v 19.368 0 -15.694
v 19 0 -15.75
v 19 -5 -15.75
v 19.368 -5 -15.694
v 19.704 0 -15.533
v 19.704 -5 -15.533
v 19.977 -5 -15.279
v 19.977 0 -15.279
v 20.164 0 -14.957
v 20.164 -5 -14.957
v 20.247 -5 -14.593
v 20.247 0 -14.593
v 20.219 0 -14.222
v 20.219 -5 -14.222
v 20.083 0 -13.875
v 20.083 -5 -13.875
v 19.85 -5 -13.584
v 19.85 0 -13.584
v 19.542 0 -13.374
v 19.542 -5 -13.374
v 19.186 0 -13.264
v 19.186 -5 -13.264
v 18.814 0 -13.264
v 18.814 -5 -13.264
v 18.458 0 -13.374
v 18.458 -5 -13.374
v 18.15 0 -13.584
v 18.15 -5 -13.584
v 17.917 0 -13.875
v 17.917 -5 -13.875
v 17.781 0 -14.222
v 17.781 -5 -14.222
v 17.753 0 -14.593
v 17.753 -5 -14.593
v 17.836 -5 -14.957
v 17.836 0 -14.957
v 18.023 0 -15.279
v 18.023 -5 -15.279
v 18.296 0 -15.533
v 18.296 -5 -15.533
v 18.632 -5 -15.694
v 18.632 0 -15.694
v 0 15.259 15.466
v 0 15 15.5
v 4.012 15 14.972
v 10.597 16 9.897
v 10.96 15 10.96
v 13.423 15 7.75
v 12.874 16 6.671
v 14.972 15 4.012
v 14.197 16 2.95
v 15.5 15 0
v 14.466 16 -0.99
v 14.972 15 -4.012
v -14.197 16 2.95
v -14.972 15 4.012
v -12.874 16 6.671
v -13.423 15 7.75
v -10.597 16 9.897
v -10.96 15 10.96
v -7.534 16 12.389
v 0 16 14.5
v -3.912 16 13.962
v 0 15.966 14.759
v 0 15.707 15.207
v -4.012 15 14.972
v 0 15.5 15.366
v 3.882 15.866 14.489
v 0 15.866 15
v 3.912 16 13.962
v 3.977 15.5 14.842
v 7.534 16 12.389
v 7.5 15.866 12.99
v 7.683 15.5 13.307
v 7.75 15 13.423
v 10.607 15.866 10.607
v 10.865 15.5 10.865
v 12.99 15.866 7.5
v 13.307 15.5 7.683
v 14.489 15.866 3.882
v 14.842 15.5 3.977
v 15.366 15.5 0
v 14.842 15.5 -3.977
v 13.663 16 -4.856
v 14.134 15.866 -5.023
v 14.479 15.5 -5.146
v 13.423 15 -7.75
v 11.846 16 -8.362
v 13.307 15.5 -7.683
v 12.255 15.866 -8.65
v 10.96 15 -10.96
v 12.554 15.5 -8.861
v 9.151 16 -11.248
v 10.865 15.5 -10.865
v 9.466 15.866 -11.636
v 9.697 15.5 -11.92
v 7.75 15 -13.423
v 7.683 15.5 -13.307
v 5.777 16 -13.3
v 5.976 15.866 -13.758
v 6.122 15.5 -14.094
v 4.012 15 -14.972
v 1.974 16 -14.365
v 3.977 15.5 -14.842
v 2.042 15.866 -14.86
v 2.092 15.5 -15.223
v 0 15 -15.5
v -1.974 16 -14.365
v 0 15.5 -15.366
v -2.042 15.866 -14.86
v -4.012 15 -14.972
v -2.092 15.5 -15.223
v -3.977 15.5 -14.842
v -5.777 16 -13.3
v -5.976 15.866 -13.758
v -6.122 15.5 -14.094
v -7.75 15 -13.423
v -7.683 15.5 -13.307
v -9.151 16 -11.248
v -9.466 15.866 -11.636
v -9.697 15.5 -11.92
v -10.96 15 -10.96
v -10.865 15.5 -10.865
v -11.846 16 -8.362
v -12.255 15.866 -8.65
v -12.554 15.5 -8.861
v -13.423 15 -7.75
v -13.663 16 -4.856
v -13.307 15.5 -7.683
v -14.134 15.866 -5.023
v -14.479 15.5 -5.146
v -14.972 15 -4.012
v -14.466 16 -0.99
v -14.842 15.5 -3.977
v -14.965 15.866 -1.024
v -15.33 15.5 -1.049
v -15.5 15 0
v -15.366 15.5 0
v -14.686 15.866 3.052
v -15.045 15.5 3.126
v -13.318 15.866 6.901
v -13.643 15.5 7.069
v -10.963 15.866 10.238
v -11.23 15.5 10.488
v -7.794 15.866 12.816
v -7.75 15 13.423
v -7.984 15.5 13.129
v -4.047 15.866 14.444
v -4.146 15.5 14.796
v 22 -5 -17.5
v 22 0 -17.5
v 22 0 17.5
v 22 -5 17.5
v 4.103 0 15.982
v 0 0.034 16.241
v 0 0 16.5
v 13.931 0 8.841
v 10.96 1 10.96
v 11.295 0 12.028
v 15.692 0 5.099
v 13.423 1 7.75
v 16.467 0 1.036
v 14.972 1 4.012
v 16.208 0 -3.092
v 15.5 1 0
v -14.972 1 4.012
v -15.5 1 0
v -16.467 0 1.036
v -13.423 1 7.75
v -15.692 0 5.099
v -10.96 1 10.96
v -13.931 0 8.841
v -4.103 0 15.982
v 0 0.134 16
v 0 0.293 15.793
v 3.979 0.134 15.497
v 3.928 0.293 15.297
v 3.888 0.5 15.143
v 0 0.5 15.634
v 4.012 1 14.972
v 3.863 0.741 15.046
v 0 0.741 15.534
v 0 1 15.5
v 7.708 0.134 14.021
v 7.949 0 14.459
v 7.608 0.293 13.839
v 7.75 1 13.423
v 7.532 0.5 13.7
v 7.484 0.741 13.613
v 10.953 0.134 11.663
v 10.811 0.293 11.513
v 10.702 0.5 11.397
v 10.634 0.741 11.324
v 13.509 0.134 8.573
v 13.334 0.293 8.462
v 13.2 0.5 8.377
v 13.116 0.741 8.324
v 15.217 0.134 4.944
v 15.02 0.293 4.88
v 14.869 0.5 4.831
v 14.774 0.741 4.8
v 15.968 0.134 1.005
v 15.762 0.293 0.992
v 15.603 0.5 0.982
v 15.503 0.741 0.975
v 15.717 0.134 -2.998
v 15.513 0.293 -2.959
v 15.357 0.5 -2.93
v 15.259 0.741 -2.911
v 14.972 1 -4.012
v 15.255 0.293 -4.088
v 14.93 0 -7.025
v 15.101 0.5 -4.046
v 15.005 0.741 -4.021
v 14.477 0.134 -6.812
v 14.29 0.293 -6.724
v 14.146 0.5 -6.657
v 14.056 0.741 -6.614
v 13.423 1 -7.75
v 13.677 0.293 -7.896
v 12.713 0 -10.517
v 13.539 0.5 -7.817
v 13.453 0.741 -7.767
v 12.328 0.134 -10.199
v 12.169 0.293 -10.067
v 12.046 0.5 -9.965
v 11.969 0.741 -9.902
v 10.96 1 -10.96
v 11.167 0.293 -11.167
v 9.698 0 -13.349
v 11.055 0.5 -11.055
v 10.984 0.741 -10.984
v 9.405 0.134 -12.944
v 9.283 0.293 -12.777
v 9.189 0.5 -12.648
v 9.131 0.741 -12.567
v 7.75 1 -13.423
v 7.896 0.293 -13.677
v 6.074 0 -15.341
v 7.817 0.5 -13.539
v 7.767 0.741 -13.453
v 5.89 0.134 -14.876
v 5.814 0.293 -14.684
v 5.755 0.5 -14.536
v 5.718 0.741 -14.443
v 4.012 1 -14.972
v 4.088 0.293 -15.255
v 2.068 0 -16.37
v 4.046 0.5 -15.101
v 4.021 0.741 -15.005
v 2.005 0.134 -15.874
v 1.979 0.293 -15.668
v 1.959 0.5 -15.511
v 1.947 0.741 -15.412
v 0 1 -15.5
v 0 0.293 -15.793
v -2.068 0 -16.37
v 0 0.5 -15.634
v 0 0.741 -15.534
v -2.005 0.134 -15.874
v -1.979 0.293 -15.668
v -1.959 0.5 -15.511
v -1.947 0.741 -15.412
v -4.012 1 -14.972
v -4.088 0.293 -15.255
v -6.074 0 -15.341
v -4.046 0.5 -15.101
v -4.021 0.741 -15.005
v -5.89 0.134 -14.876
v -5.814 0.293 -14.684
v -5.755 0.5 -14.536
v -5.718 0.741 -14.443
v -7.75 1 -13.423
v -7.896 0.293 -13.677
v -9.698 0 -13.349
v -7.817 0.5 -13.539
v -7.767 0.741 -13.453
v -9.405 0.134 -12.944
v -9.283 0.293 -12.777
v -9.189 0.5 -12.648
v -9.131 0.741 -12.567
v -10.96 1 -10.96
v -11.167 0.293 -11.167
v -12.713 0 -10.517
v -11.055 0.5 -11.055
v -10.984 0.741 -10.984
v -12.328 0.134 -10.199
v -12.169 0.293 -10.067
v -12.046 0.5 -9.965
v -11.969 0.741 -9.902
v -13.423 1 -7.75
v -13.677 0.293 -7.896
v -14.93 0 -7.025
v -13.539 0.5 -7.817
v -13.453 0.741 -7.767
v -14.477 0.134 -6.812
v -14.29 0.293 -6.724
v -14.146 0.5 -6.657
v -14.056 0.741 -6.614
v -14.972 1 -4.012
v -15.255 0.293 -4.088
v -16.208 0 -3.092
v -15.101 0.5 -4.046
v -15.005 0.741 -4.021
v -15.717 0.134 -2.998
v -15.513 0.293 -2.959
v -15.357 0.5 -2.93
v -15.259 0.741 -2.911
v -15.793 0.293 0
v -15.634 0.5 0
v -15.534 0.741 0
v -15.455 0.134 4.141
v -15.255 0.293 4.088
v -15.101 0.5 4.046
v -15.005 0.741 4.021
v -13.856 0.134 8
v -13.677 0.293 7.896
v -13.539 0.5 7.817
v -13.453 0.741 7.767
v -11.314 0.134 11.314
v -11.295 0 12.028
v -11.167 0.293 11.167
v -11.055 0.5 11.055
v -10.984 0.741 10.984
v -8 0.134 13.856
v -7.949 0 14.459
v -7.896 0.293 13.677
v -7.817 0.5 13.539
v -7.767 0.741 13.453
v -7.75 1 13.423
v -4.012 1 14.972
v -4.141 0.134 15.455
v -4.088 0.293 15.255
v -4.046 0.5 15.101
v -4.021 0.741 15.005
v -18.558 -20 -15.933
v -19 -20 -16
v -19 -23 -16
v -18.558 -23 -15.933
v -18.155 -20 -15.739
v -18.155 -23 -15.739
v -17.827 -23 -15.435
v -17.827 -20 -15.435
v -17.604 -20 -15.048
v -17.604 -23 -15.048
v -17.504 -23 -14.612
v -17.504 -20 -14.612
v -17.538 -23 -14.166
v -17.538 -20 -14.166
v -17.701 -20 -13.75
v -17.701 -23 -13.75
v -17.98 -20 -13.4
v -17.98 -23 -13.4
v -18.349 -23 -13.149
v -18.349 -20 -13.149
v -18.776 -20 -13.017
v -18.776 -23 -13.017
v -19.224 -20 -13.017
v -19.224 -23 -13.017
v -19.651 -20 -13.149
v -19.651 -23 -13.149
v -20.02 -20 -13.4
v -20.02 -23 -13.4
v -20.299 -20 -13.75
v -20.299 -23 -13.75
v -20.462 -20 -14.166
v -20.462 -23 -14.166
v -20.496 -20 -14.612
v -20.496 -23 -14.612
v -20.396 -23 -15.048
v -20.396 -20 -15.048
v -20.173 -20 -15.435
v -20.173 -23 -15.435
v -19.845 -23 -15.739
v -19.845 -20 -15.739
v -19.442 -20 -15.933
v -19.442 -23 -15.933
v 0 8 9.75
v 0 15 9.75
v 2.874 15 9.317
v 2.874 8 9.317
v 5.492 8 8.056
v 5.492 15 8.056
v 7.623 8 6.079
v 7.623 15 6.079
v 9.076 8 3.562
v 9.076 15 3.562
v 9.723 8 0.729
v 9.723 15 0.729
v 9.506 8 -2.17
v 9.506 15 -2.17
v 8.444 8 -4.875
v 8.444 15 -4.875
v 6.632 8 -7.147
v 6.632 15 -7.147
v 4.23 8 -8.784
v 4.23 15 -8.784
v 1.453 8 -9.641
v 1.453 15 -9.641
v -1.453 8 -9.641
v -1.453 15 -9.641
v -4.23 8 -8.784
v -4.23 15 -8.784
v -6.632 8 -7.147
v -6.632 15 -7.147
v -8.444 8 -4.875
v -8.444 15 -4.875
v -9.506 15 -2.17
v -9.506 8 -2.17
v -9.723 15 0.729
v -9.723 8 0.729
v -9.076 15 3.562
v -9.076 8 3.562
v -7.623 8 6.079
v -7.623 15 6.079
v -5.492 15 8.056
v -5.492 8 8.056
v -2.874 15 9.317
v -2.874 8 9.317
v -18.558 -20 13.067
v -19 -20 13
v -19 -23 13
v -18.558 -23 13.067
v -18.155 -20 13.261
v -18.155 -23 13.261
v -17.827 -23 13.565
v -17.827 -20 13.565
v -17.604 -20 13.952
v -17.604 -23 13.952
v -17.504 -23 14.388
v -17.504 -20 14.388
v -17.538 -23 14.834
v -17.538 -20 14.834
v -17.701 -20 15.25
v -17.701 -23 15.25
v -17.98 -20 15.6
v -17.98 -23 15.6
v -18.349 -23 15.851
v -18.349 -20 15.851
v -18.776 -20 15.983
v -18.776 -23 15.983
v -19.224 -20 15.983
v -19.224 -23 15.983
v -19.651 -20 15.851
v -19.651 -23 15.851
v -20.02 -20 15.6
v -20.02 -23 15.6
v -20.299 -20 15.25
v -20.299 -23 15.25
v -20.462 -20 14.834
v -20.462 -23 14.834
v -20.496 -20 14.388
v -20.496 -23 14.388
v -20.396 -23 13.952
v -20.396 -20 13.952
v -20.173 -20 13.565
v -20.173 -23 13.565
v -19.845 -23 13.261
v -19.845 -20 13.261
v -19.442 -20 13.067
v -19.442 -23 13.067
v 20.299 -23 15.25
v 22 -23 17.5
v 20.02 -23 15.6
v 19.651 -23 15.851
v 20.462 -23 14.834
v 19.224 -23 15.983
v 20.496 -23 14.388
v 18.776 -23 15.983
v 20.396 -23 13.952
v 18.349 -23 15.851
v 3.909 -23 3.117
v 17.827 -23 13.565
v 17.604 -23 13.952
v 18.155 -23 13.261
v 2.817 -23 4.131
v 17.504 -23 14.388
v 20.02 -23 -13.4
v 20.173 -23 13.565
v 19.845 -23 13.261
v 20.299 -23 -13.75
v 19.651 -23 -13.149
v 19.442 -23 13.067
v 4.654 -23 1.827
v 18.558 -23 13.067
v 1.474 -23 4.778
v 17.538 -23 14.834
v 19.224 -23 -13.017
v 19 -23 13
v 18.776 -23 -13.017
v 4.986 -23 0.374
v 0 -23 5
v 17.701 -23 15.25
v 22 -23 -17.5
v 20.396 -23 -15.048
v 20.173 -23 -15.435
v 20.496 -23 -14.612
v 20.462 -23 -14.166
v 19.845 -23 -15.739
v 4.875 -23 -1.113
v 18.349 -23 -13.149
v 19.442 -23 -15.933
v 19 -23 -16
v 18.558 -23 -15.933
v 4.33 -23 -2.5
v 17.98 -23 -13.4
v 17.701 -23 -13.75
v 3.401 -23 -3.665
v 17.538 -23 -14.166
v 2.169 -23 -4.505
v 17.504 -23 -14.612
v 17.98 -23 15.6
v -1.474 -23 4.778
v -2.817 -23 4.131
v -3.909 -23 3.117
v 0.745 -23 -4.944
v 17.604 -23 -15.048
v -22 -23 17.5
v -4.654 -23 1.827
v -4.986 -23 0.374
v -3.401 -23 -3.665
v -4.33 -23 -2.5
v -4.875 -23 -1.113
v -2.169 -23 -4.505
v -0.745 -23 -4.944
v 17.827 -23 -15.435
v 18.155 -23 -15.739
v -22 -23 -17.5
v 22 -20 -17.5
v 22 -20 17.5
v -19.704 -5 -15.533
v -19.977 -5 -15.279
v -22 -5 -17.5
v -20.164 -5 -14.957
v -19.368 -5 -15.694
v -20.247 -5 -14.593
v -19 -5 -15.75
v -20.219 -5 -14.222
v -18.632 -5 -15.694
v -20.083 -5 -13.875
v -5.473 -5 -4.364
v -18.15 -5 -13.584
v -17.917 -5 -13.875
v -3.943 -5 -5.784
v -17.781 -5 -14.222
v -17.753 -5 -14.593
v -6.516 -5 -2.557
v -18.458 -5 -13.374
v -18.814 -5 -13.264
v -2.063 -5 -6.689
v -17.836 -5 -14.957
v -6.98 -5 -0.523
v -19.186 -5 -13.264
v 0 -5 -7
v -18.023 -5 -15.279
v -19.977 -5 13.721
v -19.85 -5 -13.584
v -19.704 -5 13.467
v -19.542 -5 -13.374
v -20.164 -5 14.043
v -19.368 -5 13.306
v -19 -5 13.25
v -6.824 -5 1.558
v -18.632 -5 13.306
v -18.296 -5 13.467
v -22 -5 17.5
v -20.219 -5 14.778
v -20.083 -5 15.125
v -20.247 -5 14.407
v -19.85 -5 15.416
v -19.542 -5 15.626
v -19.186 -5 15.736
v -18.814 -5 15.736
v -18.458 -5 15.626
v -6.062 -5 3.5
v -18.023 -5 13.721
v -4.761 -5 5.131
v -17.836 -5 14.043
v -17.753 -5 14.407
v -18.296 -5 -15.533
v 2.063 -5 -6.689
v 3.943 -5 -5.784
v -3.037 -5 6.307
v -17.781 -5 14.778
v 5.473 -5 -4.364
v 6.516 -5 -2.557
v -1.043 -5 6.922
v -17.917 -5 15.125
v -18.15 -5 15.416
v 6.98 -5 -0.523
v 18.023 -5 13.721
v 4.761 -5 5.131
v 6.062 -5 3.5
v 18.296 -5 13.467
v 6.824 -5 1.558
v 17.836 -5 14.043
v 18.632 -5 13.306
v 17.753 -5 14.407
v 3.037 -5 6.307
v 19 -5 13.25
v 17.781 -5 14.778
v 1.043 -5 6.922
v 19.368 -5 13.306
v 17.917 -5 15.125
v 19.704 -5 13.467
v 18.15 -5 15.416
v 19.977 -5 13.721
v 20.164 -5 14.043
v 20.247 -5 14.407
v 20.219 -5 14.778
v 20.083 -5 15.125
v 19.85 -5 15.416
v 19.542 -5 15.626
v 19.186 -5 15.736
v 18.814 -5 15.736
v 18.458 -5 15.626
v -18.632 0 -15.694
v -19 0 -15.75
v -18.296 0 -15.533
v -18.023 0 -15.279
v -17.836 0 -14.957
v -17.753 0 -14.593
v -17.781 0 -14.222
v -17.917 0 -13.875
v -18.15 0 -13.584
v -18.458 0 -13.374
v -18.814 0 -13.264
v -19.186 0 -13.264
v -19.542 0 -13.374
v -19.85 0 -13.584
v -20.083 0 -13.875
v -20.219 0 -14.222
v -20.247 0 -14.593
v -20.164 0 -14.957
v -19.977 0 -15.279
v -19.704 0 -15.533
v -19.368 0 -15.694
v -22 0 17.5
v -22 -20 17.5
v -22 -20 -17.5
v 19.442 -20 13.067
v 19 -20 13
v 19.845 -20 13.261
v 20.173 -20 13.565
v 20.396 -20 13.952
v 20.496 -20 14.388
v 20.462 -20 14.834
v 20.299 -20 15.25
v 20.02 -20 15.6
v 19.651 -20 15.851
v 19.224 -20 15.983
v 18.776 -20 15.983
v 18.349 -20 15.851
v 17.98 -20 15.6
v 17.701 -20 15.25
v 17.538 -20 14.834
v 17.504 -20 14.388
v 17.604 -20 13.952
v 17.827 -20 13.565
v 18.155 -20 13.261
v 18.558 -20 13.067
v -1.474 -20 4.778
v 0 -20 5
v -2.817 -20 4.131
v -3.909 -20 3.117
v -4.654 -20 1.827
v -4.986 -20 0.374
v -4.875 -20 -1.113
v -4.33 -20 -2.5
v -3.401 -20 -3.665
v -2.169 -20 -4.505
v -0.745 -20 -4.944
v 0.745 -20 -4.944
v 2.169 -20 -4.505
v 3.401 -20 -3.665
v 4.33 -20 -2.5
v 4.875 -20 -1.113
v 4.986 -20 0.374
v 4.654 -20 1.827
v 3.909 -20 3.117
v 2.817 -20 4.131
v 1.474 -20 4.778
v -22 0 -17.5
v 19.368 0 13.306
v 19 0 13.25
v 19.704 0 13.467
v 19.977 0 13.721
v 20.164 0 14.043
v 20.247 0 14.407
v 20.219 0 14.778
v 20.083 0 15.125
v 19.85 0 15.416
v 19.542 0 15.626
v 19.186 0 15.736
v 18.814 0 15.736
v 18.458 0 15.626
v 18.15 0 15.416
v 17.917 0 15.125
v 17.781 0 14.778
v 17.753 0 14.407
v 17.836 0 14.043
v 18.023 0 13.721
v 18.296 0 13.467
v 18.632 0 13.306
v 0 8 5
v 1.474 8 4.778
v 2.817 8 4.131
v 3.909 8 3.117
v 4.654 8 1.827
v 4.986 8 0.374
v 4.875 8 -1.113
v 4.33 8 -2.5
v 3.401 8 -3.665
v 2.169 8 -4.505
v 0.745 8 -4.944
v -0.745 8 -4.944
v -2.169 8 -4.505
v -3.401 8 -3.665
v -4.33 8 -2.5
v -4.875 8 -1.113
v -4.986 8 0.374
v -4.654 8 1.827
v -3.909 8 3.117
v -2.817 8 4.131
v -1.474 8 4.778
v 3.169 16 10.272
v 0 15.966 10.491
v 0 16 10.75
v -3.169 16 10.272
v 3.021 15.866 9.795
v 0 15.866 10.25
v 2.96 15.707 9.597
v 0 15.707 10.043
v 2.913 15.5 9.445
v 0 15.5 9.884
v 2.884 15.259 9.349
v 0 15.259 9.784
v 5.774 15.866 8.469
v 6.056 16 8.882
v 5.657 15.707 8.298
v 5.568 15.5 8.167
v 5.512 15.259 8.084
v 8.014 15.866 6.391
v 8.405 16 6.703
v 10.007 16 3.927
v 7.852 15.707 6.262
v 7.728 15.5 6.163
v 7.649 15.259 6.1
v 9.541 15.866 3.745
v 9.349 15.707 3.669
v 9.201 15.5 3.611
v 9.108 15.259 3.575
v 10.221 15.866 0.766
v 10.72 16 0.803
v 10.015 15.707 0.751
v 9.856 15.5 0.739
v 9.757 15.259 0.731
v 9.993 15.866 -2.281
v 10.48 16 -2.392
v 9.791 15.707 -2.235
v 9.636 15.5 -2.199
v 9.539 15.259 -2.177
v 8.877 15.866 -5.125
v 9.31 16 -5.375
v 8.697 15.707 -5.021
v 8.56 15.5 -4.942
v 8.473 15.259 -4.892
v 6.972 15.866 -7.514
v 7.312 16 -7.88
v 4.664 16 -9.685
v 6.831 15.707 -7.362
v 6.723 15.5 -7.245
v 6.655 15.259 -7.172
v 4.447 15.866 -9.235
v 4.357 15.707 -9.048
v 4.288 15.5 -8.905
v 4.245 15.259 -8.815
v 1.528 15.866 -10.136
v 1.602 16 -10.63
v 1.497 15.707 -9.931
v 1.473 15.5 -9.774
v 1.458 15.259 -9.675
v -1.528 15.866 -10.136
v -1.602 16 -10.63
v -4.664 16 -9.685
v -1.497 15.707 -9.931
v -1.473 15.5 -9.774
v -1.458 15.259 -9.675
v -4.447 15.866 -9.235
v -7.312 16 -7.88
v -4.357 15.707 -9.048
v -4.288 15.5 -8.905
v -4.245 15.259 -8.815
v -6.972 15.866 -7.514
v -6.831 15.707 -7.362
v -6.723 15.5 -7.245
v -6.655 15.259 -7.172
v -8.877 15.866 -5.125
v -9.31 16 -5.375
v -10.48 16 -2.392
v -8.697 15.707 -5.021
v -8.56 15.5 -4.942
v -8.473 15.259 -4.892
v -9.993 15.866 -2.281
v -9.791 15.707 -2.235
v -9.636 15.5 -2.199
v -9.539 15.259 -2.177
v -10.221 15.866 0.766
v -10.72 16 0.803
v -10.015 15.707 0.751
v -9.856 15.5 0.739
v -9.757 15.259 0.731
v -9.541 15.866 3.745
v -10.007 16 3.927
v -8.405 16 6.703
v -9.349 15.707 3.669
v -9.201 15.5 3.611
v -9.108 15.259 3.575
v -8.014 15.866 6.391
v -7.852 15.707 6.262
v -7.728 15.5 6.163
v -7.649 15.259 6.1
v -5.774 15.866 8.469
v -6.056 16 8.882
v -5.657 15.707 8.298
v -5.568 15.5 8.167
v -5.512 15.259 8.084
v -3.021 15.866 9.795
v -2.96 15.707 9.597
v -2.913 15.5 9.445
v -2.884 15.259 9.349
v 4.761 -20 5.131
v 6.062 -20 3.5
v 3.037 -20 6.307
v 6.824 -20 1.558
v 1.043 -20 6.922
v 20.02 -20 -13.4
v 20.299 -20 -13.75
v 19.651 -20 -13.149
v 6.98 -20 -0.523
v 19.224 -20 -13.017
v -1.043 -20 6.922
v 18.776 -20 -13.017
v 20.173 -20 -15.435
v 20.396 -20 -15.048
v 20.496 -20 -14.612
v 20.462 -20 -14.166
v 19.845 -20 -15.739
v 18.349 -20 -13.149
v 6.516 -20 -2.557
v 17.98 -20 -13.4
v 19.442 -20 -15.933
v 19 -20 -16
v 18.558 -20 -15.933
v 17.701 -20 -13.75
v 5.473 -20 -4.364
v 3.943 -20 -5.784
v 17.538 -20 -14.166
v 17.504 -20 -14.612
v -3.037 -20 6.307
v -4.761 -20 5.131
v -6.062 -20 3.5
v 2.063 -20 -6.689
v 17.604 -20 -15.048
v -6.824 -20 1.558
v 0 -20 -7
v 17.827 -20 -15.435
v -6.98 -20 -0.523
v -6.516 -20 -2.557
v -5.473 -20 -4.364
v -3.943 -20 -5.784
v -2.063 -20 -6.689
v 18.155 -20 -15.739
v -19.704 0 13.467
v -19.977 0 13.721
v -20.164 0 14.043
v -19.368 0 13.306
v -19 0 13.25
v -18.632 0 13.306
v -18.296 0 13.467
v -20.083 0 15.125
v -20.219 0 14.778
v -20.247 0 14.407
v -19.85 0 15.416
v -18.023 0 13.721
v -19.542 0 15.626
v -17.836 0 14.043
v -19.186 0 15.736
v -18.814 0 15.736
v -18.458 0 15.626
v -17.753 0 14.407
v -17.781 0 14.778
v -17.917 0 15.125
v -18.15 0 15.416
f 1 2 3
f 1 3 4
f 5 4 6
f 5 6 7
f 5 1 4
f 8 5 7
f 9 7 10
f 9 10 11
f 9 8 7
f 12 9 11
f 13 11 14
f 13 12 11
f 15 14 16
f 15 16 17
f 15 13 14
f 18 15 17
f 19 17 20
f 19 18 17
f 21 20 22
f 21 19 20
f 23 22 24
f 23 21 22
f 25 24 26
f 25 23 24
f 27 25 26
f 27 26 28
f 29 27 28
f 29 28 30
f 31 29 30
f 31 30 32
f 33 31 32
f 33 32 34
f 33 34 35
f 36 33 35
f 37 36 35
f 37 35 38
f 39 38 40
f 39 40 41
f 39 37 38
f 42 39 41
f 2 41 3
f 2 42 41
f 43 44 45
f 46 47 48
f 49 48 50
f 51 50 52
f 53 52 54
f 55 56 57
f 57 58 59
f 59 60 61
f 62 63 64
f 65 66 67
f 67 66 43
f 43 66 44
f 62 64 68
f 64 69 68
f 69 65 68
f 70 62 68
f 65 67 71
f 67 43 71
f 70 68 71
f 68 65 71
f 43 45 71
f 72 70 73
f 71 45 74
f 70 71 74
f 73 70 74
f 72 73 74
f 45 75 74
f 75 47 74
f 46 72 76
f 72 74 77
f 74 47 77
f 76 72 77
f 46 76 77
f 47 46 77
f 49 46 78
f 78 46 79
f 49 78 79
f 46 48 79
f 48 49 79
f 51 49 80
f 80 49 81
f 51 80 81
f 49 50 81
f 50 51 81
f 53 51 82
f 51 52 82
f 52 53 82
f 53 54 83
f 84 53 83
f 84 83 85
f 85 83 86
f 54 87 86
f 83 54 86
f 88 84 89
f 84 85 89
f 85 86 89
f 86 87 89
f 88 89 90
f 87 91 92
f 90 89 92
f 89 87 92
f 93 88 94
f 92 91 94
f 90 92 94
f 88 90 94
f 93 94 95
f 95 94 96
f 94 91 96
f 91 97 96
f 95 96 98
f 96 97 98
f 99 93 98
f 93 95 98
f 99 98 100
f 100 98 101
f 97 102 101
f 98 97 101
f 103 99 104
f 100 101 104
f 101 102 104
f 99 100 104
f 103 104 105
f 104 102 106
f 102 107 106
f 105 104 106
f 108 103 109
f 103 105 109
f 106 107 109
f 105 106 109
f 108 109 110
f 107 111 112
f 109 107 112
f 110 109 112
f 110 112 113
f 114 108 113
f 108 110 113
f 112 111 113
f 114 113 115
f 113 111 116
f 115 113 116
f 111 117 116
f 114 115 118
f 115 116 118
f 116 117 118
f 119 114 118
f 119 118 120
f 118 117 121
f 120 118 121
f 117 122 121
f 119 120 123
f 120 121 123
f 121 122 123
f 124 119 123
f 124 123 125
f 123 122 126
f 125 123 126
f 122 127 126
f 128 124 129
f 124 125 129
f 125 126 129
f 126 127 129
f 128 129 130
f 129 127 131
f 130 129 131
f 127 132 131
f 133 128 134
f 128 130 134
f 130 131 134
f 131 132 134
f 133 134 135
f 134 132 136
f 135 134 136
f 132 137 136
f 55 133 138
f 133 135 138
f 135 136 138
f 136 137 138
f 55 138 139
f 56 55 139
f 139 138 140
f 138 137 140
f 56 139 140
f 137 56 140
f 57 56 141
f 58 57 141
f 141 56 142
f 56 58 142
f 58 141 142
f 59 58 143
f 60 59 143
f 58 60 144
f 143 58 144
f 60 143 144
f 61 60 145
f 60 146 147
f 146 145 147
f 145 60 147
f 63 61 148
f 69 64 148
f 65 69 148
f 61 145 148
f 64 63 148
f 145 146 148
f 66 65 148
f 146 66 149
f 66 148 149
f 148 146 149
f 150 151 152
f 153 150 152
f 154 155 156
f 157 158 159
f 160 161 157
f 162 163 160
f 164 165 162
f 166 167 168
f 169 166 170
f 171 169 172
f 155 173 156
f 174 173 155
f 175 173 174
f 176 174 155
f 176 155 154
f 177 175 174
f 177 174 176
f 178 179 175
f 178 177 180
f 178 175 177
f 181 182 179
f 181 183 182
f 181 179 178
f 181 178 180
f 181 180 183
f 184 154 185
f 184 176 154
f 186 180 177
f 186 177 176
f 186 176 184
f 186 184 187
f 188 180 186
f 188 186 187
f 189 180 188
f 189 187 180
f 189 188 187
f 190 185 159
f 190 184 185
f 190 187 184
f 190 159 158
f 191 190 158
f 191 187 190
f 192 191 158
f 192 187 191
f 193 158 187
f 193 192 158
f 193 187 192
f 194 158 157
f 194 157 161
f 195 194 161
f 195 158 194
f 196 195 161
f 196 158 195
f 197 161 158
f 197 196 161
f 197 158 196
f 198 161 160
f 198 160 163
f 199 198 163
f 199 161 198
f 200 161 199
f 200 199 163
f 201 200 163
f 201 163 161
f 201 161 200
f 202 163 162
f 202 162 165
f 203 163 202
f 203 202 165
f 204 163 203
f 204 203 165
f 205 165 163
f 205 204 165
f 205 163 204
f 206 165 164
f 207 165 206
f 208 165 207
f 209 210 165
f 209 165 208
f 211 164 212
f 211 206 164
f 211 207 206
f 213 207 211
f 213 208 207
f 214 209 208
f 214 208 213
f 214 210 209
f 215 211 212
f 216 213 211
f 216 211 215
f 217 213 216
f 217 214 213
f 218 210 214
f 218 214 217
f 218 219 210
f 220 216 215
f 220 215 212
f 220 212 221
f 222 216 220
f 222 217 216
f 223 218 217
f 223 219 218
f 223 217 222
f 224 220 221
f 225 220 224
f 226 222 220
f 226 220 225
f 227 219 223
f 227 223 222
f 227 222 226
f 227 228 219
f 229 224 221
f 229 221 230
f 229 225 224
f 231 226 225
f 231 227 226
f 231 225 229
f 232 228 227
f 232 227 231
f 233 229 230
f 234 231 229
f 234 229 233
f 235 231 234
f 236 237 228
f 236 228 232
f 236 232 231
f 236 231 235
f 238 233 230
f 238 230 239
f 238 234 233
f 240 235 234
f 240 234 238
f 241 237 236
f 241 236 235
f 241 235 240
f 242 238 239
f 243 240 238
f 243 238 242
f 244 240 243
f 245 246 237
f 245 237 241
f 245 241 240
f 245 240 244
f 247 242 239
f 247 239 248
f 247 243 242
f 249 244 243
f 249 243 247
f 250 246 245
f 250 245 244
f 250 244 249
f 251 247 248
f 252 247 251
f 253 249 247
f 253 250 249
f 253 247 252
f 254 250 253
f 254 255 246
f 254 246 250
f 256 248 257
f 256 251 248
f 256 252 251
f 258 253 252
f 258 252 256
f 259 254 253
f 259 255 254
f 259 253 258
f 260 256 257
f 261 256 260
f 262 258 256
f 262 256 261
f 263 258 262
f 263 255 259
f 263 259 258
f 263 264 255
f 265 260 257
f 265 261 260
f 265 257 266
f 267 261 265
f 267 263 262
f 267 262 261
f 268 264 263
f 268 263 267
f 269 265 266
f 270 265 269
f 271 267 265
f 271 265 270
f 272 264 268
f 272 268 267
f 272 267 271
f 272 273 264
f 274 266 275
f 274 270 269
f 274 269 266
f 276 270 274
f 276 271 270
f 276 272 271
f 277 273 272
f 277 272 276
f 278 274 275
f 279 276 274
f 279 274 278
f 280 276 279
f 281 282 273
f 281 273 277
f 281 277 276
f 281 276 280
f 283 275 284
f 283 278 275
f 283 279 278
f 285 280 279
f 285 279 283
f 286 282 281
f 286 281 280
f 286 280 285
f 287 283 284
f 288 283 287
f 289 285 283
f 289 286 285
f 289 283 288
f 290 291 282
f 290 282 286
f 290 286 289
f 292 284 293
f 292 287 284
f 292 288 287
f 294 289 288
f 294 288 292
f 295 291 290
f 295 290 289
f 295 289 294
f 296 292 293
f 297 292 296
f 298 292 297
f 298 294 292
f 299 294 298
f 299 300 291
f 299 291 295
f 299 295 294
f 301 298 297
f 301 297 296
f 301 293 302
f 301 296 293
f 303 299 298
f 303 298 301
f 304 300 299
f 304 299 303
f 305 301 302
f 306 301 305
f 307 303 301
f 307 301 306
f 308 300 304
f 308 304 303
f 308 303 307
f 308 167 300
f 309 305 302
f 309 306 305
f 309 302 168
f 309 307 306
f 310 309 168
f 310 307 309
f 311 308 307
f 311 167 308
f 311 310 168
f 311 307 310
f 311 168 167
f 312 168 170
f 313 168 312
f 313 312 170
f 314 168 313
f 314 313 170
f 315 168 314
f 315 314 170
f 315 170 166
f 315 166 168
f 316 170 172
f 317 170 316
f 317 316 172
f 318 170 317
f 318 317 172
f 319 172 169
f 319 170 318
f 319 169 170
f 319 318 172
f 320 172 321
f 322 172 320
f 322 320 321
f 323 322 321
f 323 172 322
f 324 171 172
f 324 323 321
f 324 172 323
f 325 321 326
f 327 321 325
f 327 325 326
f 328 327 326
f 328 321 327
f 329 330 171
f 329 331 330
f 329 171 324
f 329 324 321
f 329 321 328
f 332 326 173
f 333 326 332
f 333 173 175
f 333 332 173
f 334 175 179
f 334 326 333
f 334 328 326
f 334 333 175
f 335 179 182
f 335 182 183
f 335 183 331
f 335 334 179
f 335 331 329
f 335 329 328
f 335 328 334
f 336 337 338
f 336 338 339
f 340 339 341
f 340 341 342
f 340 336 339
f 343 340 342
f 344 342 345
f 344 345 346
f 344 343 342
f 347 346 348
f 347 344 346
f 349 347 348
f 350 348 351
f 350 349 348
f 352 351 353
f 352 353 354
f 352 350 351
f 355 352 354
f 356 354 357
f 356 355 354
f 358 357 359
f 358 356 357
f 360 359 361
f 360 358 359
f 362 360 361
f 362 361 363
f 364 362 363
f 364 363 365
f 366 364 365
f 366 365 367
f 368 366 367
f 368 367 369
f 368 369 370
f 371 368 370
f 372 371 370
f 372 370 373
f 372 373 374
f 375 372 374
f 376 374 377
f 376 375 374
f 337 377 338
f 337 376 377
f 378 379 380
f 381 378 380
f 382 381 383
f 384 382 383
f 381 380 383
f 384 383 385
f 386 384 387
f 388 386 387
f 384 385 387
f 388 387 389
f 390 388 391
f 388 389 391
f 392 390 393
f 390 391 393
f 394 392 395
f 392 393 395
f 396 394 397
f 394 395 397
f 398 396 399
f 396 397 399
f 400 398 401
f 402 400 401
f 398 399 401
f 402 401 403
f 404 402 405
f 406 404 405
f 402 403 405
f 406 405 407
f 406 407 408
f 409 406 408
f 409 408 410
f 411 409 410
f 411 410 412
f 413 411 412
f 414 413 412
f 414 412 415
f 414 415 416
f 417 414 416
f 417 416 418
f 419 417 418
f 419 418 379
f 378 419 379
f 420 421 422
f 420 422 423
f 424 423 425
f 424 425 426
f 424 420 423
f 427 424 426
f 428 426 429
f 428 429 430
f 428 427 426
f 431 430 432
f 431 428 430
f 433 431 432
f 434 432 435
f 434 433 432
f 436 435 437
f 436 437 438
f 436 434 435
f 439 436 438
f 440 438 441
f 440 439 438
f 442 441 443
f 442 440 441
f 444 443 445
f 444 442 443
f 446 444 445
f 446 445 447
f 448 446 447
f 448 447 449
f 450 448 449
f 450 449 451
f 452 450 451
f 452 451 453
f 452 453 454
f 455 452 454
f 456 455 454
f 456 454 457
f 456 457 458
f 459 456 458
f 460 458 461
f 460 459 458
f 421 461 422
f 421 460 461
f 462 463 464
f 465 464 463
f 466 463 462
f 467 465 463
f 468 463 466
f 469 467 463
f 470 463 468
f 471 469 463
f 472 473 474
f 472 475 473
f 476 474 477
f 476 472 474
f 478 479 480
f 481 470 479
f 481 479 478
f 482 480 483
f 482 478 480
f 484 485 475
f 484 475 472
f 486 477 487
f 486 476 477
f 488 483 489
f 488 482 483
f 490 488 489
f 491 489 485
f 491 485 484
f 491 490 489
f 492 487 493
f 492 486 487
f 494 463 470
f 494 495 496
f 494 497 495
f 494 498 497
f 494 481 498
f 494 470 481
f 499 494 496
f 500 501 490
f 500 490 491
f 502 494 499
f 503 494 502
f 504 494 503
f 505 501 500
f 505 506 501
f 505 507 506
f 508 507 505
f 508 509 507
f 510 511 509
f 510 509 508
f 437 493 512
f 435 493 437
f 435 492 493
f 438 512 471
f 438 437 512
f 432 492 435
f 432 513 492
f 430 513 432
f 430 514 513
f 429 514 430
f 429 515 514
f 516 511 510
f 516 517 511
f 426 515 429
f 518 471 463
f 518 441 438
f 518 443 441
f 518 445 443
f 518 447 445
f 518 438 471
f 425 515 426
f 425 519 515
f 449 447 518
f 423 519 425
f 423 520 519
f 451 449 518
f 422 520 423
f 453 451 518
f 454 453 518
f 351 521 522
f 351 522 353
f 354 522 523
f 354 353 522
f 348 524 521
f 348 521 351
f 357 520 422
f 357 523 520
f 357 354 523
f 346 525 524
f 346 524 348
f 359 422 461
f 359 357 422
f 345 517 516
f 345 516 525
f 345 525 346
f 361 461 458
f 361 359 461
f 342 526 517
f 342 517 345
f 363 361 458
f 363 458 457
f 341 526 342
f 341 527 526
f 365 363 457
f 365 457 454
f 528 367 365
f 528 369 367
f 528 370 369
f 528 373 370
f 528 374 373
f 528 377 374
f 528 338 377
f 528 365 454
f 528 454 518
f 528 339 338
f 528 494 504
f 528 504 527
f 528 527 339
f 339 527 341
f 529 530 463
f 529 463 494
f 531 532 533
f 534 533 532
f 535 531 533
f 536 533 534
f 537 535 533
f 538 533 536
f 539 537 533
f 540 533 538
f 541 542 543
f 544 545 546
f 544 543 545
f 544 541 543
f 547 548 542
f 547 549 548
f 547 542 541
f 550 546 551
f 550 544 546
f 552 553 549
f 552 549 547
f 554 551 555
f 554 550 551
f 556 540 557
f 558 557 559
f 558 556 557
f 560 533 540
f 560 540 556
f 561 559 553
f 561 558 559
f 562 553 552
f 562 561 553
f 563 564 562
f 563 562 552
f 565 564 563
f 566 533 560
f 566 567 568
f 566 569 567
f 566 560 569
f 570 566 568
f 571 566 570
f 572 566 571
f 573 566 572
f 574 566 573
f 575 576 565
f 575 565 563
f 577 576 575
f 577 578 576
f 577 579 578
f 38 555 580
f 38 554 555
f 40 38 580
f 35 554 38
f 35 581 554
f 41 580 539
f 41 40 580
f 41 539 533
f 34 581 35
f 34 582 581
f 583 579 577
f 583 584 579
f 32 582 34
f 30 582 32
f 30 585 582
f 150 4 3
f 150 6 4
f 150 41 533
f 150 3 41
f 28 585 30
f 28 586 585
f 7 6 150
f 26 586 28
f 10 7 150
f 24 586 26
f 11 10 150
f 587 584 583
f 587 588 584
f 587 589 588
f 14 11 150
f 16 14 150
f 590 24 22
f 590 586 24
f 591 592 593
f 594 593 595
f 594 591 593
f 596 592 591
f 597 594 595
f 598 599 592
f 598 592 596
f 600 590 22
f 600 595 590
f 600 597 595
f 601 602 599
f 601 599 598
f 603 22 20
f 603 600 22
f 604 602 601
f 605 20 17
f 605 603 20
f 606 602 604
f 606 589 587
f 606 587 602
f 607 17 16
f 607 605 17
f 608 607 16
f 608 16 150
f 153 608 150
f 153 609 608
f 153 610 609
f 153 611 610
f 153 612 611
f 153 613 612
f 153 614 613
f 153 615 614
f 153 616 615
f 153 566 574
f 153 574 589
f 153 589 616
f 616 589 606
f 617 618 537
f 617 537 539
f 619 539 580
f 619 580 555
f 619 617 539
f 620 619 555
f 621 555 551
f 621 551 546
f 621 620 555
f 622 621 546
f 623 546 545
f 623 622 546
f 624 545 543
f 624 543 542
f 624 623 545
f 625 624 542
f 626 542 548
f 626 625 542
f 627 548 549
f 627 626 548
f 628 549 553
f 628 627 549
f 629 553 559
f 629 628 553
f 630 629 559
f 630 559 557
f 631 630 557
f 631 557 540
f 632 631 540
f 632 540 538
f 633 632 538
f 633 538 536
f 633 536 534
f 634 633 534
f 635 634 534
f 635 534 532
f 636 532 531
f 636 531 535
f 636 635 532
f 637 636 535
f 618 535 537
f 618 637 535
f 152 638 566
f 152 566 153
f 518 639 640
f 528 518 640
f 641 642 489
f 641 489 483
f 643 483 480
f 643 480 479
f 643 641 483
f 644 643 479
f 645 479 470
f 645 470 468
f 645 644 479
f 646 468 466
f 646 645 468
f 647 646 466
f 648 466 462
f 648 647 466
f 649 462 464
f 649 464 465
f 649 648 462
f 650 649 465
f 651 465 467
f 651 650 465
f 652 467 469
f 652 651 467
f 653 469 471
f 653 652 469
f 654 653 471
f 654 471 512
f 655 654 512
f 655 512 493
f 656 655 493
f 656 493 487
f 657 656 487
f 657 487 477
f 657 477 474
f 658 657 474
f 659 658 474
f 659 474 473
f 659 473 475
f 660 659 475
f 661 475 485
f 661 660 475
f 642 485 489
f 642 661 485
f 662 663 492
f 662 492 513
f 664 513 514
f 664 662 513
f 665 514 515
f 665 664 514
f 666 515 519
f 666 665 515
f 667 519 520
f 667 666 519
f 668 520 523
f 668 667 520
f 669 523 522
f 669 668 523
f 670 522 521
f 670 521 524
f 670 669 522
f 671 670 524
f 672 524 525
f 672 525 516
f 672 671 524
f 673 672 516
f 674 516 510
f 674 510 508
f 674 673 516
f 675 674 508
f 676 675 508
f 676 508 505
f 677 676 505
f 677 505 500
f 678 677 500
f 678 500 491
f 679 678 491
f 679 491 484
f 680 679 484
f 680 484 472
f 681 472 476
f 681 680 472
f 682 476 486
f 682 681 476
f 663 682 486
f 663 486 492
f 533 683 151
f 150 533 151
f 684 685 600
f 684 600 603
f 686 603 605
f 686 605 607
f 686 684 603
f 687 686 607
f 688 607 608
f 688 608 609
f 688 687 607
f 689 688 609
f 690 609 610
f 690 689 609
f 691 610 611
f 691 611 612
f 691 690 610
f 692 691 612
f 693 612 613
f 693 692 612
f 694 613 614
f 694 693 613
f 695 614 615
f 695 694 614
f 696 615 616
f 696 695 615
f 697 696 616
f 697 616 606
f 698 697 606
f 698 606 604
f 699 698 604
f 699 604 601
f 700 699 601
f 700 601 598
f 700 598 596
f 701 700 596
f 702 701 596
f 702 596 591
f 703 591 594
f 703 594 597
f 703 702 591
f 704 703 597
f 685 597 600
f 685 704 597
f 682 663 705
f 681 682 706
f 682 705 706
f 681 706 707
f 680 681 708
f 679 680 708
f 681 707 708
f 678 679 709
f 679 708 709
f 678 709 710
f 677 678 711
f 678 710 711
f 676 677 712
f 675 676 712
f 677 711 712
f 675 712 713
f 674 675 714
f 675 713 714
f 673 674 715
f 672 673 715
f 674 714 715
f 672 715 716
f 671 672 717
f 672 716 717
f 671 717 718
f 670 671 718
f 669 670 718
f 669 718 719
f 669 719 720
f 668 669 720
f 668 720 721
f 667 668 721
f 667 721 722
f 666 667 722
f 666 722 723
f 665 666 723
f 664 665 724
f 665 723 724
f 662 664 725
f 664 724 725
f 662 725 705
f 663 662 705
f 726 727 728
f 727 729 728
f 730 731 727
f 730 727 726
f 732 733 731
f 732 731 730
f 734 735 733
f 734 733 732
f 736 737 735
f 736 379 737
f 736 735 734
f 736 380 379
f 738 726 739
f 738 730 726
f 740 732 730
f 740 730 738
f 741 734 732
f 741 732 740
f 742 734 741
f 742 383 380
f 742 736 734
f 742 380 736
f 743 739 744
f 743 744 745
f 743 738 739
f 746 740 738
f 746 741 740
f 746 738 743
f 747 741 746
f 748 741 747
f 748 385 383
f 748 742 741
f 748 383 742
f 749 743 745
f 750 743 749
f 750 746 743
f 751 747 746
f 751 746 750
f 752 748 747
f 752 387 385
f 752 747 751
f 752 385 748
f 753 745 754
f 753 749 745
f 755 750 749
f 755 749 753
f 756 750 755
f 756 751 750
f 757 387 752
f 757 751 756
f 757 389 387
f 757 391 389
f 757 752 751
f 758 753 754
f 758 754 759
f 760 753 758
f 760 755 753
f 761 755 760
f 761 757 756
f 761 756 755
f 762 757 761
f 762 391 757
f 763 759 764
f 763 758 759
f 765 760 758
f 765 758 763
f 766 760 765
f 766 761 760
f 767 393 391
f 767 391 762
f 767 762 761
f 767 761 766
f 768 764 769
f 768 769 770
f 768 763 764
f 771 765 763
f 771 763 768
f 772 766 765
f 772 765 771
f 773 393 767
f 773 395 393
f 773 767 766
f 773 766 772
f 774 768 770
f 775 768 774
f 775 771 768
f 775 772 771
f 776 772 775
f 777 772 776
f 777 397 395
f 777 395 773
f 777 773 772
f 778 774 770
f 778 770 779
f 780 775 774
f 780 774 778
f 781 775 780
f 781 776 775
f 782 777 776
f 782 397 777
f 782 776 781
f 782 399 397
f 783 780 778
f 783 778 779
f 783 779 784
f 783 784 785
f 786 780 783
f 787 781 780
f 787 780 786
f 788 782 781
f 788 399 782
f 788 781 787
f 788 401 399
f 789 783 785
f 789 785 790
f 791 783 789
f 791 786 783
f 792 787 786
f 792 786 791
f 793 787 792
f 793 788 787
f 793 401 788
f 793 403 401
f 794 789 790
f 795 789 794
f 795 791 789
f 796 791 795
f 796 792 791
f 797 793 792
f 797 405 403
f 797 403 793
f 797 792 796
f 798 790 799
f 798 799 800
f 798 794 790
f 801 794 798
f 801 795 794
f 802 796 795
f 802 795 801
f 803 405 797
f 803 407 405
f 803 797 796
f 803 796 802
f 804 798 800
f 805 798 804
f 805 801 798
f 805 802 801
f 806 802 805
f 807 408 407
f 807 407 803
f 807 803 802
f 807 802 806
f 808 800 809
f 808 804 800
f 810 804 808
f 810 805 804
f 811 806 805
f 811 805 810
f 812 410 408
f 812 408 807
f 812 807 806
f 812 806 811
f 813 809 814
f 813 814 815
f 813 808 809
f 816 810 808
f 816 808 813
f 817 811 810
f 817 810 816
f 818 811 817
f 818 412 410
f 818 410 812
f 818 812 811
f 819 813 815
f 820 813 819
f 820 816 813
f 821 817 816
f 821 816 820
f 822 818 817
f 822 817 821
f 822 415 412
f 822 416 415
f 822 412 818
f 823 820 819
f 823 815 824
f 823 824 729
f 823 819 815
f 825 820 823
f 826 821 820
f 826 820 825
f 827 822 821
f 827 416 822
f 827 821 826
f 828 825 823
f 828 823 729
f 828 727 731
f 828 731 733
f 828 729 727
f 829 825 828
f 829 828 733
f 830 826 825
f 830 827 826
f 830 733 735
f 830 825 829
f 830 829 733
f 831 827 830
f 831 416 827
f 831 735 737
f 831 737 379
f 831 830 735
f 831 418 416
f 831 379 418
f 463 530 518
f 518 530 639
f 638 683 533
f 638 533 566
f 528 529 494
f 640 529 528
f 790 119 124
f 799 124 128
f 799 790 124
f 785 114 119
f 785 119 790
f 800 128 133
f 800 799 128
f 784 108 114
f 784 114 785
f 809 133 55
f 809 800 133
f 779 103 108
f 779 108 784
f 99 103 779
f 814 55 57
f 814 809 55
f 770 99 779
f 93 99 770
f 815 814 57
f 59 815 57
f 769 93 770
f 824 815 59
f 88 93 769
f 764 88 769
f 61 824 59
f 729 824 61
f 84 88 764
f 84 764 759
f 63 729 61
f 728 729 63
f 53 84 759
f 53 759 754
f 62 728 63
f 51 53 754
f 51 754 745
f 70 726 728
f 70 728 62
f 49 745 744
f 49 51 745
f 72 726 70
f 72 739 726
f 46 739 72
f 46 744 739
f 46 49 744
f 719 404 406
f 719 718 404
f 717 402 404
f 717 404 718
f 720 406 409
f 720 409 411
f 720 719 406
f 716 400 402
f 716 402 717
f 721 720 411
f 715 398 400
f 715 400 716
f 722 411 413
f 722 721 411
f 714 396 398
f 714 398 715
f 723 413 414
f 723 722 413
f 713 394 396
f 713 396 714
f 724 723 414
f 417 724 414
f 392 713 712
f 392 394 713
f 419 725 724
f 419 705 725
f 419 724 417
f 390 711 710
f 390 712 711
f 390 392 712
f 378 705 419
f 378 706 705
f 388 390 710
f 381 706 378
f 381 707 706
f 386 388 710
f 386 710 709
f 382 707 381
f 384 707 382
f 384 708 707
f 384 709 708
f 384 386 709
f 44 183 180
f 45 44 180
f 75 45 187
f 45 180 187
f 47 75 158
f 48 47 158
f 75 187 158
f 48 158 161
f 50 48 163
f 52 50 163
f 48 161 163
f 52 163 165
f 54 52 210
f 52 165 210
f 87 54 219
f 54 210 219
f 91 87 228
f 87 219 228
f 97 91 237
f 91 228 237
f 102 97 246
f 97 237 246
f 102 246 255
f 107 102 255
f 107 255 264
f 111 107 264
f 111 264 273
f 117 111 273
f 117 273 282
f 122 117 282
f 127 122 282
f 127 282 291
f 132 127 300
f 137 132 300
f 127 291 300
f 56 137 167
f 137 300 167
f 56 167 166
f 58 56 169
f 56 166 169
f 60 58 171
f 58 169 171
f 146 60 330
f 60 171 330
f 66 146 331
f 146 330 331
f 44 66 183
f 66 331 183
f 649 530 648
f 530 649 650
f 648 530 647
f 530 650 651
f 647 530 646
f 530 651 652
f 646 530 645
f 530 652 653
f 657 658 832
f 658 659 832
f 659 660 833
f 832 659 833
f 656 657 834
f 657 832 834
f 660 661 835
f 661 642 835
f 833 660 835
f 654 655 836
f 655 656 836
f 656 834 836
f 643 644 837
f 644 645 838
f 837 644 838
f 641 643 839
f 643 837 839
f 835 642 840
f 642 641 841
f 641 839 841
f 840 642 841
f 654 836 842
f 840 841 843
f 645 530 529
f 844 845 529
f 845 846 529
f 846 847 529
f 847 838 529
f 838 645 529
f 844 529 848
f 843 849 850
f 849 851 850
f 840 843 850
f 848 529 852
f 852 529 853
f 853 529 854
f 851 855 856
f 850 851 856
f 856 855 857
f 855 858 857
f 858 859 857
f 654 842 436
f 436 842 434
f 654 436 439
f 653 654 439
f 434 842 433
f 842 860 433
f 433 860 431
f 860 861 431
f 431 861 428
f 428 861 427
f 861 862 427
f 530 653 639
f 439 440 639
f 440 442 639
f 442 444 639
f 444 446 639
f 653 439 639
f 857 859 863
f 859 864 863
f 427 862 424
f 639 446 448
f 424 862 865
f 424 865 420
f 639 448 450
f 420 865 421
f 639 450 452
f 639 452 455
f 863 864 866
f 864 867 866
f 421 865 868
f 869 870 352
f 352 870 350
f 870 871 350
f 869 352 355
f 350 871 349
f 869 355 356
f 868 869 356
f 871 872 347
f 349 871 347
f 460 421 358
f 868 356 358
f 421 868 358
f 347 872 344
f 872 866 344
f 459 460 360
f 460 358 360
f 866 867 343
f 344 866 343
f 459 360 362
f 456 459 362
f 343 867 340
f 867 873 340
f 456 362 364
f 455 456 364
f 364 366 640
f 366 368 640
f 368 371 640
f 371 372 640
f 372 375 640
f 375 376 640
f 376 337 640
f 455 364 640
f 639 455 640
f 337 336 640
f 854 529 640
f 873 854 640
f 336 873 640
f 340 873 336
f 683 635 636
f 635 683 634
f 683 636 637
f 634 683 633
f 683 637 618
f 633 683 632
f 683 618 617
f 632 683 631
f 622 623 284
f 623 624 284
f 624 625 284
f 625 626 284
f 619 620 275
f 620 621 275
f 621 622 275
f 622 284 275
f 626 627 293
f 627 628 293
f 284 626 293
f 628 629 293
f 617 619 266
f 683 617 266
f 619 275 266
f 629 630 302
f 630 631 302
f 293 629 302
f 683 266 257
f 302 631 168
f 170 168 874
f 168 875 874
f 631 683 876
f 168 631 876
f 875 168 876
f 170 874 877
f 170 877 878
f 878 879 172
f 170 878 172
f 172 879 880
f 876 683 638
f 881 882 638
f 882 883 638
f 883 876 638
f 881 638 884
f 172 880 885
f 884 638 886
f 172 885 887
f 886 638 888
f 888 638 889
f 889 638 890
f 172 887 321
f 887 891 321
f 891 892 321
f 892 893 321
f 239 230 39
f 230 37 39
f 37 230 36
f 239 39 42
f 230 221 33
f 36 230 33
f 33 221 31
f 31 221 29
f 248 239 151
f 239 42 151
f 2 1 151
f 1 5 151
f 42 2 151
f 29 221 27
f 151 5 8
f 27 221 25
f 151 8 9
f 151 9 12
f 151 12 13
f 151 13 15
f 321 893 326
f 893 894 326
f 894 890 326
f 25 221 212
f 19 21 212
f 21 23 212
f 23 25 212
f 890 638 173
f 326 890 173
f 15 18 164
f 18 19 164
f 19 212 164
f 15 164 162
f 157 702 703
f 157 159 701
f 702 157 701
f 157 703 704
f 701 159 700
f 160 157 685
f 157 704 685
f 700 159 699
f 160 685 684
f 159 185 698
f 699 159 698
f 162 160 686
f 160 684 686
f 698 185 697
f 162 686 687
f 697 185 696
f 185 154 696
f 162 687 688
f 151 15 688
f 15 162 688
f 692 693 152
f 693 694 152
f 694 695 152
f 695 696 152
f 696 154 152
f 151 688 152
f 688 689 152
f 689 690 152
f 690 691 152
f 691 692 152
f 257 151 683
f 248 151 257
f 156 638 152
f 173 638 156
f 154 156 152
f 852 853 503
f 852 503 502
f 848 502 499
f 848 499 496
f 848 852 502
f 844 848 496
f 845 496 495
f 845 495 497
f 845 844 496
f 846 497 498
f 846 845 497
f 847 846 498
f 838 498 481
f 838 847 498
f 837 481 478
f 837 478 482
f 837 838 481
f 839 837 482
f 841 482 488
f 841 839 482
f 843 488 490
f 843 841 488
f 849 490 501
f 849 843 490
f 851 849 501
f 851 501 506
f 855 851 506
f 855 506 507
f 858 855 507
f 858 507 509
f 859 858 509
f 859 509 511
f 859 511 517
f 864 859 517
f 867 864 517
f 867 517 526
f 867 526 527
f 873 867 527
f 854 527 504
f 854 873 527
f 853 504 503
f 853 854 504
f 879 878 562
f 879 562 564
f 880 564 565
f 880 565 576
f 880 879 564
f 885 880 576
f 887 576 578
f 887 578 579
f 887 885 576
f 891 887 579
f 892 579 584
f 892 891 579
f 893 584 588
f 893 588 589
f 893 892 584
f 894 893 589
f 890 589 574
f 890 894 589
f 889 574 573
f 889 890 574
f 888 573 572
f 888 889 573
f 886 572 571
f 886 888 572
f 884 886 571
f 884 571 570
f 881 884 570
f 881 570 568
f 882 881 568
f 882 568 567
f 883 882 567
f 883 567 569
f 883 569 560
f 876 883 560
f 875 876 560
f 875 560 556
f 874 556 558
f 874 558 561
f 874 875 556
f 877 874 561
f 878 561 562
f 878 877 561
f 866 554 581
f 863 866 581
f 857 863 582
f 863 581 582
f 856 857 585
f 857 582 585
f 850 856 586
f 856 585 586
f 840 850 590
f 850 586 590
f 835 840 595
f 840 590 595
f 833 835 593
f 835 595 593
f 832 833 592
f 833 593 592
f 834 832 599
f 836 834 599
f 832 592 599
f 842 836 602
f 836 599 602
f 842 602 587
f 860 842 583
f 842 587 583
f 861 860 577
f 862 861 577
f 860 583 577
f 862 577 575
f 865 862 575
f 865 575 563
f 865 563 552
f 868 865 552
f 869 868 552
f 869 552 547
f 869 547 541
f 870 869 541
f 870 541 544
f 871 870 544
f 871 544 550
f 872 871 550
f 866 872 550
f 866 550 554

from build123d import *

# Parameters (mm, degrees)
SKETCH1_R           = 15.5
BOSS_EXTRUDE1_DEPTH = 16
SKETCH16_W          = 44
SKETCH16_H          = 35
SKETCH16_R          = 1.25
BOSS_EXTRUDE6_DEPTH = 5
SKETCH17_R          = 9.75
CUT_EXTRUDE5_DEPTH  = 6
SKETCH18_R          = 5
CUT_EXTRUDE7_DEPTH  = 19
FILLET4_R           = 1
FILLET1_R           = 1
FILLET3_R           = 1
SKETCH2_R           = 7
BOSS_EXTRUDE3_DEPTH = 20
SKETCH5_R           = 9.75
CUT_EXTRUDE1_DEPTH  = 8
SKETCH6_R           = 5
CUT_EXTRUDE2_DEPTH  = 30
SKETCH12_W          = 44
SKETCH12_H          = 35
BOSS_EXTRUDE4_DEPTH = 3
SKETCH14_R          = 1.5
CUT_EXTRUDE3_DEPTH  = 3
SKETCH15_R          = 5
CUT_EXTRUDE4_DEPTH  = 3


with BuildPart() as part:
    # Sketch1 → Boss-Extrude1 (new body)
    with BuildSketch(Plane(origin=(0, 0, 0), x_dir=(1, 0, 0), z_dir=(0, 1, 0))):
        with Locations(Location((0, 0, 0), (0, 0, 270))):
            Circle(SKETCH1_R)
    extrude(amount=BOSS_EXTRUDE1_DEPTH)

    # Sketch16 → Boss-Extrude6 (add)
    with BuildSketch(Plane.XZ):
        Rectangle(SKETCH16_W, SKETCH16_H)
        with Locations(Location((-19, 14.5, 0), (0, 0, 270))):
            Circle(SKETCH16_R, mode=Mode.SUBTRACT)
        with Locations(Location((19, 14.5, 0), (0, 0, 270))):
            Circle(SKETCH16_R, mode=Mode.SUBTRACT)
        with Locations(Location((19, -14.5, 0), (0, 0, 270))):
            Circle(SKETCH16_R, mode=Mode.SUBTRACT)
        with Locations(Location((-19, -14.5, 0), (0, 0, 270))):
            Circle(SKETCH16_R, mode=Mode.SUBTRACT)
    extrude(amount=BOSS_EXTRUDE6_DEPTH)

    # Sketch17 → Cut-Extrude5 (cut)
    with BuildSketch(Plane(origin=(0, 16, 0), x_dir=(1, 0, 0), z_dir=(0, 1, 0))):
        with Locations(Location((0, 0, 0), (0, 0, 270))):
            Circle(SKETCH17_R)
    extrude(amount=-CUT_EXTRUDE5_DEPTH, mode=Mode.SUBTRACT)

    # Sketch18 → Cut-Extrude7 (cut)
    with BuildSketch(Plane(origin=(0, 10, 0), x_dir=(1, 0, 0), z_dir=(0, 1, 0))):
        with Locations(Location((0, 0, 0), (0, 0, 270))):
            Circle(SKETCH18_R)
    extrude(amount=-CUT_EXTRUDE7_DEPTH, mode=Mode.SUBTRACT)

    # Fillet4
    fillet4_edges = [part.edges().sort_by_distance(p)[0] for p in [
        (0, 0, -15.5),
    ]]
    fillet(fillet4_edges, radius=FILLET4_R)

    # Fillet1
    fillet1_edges = [part.edges().sort_by_distance(p)[0] for p in [
        (0, 16, -9.75),
    ]]
    fillet(fillet1_edges, radius=FILLET1_R)

    # Fillet3
    fillet3_edges = [part.edges().sort_by_distance(p)[0] for p in [
        (0, 16, -15.5),
    ]]
    fillet(fillet3_edges, radius=FILLET3_R)

    # Sketch2 → Boss-Extrude3 (add)
    with BuildSketch(Plane(origin=(0, 0, 0), x_dir=(-1, 0, 0), z_dir=(0, -1, 0))):
        with Locations(Location((0, 0, 0), (0, 0, 90))):
            Circle(SKETCH2_R)
    extrude(amount=BOSS_EXTRUDE3_DEPTH)

    # Sketch5 → Cut-Extrude1 (cut)
    with BuildSketch(Plane(origin=(0, 16, 0), x_dir=(1, 0, 0), z_dir=(0, 1, 0))):
        with Locations(Location((0, 0, 0), (0, 0, 270))):
            Circle(SKETCH5_R)
    extrude(amount=-CUT_EXTRUDE1_DEPTH, mode=Mode.SUBTRACT)

    # Sketch6 → Cut-Extrude2 (cut)
    with BuildSketch(Plane(origin=(0, 8, 0), x_dir=(1, 0, 0), z_dir=(0, 1, 0))):
        with Locations(Location((0, 0, 0), (0, 0, 270))):
            Circle(SKETCH6_R)
    extrude(amount=-CUT_EXTRUDE2_DEPTH, mode=Mode.SUBTRACT)

    # Sketch12 → Boss-Extrude4 (add)
    with BuildSketch(Plane(origin=(0, -20, 0), x_dir=(-1, 0, 0), z_dir=(0, -1, 0))):
        Rectangle(SKETCH12_W, SKETCH12_H)
    extrude(amount=BOSS_EXTRUDE4_DEPTH)

    # Sketch14 → Cut-Extrude3 (cut)
    with BuildSketch(Plane(origin=(0, -20, 0), x_dir=(-1, 0, 0), z_dir=(0, -1, 0))):
        with Locations(Location((-19, -14.5, 0), (0, 0, 90))):
            Circle(SKETCH14_R)
        with Locations(Location((19, -14.5, 0), (0, 0, 90))):
            Circle(SKETCH14_R)
        with Locations(Location((19, 14.5, 0), (0, 0, 90))):
            Circle(SKETCH14_R)
        with Locations(Location((-19, 14.5, 0), (0, 0, 90))):
            Circle(SKETCH14_R)
    extrude(amount=CUT_EXTRUDE3_DEPTH, mode=Mode.SUBTRACT)

    # Sketch15 → Cut-Extrude4 (cut)
    with BuildSketch(Plane(origin=(0, -20, 0), x_dir=(-1, 0, 0), z_dir=(0, -1, 0))):
        with Locations(Location((0, 0, 0), (0, 0, 270))):
            Circle(SKETCH15_R)
    extrude(amount=CUT_EXTRUDE4_DEPTH, mode=Mode.SUBTRACT)


solid = part.part
